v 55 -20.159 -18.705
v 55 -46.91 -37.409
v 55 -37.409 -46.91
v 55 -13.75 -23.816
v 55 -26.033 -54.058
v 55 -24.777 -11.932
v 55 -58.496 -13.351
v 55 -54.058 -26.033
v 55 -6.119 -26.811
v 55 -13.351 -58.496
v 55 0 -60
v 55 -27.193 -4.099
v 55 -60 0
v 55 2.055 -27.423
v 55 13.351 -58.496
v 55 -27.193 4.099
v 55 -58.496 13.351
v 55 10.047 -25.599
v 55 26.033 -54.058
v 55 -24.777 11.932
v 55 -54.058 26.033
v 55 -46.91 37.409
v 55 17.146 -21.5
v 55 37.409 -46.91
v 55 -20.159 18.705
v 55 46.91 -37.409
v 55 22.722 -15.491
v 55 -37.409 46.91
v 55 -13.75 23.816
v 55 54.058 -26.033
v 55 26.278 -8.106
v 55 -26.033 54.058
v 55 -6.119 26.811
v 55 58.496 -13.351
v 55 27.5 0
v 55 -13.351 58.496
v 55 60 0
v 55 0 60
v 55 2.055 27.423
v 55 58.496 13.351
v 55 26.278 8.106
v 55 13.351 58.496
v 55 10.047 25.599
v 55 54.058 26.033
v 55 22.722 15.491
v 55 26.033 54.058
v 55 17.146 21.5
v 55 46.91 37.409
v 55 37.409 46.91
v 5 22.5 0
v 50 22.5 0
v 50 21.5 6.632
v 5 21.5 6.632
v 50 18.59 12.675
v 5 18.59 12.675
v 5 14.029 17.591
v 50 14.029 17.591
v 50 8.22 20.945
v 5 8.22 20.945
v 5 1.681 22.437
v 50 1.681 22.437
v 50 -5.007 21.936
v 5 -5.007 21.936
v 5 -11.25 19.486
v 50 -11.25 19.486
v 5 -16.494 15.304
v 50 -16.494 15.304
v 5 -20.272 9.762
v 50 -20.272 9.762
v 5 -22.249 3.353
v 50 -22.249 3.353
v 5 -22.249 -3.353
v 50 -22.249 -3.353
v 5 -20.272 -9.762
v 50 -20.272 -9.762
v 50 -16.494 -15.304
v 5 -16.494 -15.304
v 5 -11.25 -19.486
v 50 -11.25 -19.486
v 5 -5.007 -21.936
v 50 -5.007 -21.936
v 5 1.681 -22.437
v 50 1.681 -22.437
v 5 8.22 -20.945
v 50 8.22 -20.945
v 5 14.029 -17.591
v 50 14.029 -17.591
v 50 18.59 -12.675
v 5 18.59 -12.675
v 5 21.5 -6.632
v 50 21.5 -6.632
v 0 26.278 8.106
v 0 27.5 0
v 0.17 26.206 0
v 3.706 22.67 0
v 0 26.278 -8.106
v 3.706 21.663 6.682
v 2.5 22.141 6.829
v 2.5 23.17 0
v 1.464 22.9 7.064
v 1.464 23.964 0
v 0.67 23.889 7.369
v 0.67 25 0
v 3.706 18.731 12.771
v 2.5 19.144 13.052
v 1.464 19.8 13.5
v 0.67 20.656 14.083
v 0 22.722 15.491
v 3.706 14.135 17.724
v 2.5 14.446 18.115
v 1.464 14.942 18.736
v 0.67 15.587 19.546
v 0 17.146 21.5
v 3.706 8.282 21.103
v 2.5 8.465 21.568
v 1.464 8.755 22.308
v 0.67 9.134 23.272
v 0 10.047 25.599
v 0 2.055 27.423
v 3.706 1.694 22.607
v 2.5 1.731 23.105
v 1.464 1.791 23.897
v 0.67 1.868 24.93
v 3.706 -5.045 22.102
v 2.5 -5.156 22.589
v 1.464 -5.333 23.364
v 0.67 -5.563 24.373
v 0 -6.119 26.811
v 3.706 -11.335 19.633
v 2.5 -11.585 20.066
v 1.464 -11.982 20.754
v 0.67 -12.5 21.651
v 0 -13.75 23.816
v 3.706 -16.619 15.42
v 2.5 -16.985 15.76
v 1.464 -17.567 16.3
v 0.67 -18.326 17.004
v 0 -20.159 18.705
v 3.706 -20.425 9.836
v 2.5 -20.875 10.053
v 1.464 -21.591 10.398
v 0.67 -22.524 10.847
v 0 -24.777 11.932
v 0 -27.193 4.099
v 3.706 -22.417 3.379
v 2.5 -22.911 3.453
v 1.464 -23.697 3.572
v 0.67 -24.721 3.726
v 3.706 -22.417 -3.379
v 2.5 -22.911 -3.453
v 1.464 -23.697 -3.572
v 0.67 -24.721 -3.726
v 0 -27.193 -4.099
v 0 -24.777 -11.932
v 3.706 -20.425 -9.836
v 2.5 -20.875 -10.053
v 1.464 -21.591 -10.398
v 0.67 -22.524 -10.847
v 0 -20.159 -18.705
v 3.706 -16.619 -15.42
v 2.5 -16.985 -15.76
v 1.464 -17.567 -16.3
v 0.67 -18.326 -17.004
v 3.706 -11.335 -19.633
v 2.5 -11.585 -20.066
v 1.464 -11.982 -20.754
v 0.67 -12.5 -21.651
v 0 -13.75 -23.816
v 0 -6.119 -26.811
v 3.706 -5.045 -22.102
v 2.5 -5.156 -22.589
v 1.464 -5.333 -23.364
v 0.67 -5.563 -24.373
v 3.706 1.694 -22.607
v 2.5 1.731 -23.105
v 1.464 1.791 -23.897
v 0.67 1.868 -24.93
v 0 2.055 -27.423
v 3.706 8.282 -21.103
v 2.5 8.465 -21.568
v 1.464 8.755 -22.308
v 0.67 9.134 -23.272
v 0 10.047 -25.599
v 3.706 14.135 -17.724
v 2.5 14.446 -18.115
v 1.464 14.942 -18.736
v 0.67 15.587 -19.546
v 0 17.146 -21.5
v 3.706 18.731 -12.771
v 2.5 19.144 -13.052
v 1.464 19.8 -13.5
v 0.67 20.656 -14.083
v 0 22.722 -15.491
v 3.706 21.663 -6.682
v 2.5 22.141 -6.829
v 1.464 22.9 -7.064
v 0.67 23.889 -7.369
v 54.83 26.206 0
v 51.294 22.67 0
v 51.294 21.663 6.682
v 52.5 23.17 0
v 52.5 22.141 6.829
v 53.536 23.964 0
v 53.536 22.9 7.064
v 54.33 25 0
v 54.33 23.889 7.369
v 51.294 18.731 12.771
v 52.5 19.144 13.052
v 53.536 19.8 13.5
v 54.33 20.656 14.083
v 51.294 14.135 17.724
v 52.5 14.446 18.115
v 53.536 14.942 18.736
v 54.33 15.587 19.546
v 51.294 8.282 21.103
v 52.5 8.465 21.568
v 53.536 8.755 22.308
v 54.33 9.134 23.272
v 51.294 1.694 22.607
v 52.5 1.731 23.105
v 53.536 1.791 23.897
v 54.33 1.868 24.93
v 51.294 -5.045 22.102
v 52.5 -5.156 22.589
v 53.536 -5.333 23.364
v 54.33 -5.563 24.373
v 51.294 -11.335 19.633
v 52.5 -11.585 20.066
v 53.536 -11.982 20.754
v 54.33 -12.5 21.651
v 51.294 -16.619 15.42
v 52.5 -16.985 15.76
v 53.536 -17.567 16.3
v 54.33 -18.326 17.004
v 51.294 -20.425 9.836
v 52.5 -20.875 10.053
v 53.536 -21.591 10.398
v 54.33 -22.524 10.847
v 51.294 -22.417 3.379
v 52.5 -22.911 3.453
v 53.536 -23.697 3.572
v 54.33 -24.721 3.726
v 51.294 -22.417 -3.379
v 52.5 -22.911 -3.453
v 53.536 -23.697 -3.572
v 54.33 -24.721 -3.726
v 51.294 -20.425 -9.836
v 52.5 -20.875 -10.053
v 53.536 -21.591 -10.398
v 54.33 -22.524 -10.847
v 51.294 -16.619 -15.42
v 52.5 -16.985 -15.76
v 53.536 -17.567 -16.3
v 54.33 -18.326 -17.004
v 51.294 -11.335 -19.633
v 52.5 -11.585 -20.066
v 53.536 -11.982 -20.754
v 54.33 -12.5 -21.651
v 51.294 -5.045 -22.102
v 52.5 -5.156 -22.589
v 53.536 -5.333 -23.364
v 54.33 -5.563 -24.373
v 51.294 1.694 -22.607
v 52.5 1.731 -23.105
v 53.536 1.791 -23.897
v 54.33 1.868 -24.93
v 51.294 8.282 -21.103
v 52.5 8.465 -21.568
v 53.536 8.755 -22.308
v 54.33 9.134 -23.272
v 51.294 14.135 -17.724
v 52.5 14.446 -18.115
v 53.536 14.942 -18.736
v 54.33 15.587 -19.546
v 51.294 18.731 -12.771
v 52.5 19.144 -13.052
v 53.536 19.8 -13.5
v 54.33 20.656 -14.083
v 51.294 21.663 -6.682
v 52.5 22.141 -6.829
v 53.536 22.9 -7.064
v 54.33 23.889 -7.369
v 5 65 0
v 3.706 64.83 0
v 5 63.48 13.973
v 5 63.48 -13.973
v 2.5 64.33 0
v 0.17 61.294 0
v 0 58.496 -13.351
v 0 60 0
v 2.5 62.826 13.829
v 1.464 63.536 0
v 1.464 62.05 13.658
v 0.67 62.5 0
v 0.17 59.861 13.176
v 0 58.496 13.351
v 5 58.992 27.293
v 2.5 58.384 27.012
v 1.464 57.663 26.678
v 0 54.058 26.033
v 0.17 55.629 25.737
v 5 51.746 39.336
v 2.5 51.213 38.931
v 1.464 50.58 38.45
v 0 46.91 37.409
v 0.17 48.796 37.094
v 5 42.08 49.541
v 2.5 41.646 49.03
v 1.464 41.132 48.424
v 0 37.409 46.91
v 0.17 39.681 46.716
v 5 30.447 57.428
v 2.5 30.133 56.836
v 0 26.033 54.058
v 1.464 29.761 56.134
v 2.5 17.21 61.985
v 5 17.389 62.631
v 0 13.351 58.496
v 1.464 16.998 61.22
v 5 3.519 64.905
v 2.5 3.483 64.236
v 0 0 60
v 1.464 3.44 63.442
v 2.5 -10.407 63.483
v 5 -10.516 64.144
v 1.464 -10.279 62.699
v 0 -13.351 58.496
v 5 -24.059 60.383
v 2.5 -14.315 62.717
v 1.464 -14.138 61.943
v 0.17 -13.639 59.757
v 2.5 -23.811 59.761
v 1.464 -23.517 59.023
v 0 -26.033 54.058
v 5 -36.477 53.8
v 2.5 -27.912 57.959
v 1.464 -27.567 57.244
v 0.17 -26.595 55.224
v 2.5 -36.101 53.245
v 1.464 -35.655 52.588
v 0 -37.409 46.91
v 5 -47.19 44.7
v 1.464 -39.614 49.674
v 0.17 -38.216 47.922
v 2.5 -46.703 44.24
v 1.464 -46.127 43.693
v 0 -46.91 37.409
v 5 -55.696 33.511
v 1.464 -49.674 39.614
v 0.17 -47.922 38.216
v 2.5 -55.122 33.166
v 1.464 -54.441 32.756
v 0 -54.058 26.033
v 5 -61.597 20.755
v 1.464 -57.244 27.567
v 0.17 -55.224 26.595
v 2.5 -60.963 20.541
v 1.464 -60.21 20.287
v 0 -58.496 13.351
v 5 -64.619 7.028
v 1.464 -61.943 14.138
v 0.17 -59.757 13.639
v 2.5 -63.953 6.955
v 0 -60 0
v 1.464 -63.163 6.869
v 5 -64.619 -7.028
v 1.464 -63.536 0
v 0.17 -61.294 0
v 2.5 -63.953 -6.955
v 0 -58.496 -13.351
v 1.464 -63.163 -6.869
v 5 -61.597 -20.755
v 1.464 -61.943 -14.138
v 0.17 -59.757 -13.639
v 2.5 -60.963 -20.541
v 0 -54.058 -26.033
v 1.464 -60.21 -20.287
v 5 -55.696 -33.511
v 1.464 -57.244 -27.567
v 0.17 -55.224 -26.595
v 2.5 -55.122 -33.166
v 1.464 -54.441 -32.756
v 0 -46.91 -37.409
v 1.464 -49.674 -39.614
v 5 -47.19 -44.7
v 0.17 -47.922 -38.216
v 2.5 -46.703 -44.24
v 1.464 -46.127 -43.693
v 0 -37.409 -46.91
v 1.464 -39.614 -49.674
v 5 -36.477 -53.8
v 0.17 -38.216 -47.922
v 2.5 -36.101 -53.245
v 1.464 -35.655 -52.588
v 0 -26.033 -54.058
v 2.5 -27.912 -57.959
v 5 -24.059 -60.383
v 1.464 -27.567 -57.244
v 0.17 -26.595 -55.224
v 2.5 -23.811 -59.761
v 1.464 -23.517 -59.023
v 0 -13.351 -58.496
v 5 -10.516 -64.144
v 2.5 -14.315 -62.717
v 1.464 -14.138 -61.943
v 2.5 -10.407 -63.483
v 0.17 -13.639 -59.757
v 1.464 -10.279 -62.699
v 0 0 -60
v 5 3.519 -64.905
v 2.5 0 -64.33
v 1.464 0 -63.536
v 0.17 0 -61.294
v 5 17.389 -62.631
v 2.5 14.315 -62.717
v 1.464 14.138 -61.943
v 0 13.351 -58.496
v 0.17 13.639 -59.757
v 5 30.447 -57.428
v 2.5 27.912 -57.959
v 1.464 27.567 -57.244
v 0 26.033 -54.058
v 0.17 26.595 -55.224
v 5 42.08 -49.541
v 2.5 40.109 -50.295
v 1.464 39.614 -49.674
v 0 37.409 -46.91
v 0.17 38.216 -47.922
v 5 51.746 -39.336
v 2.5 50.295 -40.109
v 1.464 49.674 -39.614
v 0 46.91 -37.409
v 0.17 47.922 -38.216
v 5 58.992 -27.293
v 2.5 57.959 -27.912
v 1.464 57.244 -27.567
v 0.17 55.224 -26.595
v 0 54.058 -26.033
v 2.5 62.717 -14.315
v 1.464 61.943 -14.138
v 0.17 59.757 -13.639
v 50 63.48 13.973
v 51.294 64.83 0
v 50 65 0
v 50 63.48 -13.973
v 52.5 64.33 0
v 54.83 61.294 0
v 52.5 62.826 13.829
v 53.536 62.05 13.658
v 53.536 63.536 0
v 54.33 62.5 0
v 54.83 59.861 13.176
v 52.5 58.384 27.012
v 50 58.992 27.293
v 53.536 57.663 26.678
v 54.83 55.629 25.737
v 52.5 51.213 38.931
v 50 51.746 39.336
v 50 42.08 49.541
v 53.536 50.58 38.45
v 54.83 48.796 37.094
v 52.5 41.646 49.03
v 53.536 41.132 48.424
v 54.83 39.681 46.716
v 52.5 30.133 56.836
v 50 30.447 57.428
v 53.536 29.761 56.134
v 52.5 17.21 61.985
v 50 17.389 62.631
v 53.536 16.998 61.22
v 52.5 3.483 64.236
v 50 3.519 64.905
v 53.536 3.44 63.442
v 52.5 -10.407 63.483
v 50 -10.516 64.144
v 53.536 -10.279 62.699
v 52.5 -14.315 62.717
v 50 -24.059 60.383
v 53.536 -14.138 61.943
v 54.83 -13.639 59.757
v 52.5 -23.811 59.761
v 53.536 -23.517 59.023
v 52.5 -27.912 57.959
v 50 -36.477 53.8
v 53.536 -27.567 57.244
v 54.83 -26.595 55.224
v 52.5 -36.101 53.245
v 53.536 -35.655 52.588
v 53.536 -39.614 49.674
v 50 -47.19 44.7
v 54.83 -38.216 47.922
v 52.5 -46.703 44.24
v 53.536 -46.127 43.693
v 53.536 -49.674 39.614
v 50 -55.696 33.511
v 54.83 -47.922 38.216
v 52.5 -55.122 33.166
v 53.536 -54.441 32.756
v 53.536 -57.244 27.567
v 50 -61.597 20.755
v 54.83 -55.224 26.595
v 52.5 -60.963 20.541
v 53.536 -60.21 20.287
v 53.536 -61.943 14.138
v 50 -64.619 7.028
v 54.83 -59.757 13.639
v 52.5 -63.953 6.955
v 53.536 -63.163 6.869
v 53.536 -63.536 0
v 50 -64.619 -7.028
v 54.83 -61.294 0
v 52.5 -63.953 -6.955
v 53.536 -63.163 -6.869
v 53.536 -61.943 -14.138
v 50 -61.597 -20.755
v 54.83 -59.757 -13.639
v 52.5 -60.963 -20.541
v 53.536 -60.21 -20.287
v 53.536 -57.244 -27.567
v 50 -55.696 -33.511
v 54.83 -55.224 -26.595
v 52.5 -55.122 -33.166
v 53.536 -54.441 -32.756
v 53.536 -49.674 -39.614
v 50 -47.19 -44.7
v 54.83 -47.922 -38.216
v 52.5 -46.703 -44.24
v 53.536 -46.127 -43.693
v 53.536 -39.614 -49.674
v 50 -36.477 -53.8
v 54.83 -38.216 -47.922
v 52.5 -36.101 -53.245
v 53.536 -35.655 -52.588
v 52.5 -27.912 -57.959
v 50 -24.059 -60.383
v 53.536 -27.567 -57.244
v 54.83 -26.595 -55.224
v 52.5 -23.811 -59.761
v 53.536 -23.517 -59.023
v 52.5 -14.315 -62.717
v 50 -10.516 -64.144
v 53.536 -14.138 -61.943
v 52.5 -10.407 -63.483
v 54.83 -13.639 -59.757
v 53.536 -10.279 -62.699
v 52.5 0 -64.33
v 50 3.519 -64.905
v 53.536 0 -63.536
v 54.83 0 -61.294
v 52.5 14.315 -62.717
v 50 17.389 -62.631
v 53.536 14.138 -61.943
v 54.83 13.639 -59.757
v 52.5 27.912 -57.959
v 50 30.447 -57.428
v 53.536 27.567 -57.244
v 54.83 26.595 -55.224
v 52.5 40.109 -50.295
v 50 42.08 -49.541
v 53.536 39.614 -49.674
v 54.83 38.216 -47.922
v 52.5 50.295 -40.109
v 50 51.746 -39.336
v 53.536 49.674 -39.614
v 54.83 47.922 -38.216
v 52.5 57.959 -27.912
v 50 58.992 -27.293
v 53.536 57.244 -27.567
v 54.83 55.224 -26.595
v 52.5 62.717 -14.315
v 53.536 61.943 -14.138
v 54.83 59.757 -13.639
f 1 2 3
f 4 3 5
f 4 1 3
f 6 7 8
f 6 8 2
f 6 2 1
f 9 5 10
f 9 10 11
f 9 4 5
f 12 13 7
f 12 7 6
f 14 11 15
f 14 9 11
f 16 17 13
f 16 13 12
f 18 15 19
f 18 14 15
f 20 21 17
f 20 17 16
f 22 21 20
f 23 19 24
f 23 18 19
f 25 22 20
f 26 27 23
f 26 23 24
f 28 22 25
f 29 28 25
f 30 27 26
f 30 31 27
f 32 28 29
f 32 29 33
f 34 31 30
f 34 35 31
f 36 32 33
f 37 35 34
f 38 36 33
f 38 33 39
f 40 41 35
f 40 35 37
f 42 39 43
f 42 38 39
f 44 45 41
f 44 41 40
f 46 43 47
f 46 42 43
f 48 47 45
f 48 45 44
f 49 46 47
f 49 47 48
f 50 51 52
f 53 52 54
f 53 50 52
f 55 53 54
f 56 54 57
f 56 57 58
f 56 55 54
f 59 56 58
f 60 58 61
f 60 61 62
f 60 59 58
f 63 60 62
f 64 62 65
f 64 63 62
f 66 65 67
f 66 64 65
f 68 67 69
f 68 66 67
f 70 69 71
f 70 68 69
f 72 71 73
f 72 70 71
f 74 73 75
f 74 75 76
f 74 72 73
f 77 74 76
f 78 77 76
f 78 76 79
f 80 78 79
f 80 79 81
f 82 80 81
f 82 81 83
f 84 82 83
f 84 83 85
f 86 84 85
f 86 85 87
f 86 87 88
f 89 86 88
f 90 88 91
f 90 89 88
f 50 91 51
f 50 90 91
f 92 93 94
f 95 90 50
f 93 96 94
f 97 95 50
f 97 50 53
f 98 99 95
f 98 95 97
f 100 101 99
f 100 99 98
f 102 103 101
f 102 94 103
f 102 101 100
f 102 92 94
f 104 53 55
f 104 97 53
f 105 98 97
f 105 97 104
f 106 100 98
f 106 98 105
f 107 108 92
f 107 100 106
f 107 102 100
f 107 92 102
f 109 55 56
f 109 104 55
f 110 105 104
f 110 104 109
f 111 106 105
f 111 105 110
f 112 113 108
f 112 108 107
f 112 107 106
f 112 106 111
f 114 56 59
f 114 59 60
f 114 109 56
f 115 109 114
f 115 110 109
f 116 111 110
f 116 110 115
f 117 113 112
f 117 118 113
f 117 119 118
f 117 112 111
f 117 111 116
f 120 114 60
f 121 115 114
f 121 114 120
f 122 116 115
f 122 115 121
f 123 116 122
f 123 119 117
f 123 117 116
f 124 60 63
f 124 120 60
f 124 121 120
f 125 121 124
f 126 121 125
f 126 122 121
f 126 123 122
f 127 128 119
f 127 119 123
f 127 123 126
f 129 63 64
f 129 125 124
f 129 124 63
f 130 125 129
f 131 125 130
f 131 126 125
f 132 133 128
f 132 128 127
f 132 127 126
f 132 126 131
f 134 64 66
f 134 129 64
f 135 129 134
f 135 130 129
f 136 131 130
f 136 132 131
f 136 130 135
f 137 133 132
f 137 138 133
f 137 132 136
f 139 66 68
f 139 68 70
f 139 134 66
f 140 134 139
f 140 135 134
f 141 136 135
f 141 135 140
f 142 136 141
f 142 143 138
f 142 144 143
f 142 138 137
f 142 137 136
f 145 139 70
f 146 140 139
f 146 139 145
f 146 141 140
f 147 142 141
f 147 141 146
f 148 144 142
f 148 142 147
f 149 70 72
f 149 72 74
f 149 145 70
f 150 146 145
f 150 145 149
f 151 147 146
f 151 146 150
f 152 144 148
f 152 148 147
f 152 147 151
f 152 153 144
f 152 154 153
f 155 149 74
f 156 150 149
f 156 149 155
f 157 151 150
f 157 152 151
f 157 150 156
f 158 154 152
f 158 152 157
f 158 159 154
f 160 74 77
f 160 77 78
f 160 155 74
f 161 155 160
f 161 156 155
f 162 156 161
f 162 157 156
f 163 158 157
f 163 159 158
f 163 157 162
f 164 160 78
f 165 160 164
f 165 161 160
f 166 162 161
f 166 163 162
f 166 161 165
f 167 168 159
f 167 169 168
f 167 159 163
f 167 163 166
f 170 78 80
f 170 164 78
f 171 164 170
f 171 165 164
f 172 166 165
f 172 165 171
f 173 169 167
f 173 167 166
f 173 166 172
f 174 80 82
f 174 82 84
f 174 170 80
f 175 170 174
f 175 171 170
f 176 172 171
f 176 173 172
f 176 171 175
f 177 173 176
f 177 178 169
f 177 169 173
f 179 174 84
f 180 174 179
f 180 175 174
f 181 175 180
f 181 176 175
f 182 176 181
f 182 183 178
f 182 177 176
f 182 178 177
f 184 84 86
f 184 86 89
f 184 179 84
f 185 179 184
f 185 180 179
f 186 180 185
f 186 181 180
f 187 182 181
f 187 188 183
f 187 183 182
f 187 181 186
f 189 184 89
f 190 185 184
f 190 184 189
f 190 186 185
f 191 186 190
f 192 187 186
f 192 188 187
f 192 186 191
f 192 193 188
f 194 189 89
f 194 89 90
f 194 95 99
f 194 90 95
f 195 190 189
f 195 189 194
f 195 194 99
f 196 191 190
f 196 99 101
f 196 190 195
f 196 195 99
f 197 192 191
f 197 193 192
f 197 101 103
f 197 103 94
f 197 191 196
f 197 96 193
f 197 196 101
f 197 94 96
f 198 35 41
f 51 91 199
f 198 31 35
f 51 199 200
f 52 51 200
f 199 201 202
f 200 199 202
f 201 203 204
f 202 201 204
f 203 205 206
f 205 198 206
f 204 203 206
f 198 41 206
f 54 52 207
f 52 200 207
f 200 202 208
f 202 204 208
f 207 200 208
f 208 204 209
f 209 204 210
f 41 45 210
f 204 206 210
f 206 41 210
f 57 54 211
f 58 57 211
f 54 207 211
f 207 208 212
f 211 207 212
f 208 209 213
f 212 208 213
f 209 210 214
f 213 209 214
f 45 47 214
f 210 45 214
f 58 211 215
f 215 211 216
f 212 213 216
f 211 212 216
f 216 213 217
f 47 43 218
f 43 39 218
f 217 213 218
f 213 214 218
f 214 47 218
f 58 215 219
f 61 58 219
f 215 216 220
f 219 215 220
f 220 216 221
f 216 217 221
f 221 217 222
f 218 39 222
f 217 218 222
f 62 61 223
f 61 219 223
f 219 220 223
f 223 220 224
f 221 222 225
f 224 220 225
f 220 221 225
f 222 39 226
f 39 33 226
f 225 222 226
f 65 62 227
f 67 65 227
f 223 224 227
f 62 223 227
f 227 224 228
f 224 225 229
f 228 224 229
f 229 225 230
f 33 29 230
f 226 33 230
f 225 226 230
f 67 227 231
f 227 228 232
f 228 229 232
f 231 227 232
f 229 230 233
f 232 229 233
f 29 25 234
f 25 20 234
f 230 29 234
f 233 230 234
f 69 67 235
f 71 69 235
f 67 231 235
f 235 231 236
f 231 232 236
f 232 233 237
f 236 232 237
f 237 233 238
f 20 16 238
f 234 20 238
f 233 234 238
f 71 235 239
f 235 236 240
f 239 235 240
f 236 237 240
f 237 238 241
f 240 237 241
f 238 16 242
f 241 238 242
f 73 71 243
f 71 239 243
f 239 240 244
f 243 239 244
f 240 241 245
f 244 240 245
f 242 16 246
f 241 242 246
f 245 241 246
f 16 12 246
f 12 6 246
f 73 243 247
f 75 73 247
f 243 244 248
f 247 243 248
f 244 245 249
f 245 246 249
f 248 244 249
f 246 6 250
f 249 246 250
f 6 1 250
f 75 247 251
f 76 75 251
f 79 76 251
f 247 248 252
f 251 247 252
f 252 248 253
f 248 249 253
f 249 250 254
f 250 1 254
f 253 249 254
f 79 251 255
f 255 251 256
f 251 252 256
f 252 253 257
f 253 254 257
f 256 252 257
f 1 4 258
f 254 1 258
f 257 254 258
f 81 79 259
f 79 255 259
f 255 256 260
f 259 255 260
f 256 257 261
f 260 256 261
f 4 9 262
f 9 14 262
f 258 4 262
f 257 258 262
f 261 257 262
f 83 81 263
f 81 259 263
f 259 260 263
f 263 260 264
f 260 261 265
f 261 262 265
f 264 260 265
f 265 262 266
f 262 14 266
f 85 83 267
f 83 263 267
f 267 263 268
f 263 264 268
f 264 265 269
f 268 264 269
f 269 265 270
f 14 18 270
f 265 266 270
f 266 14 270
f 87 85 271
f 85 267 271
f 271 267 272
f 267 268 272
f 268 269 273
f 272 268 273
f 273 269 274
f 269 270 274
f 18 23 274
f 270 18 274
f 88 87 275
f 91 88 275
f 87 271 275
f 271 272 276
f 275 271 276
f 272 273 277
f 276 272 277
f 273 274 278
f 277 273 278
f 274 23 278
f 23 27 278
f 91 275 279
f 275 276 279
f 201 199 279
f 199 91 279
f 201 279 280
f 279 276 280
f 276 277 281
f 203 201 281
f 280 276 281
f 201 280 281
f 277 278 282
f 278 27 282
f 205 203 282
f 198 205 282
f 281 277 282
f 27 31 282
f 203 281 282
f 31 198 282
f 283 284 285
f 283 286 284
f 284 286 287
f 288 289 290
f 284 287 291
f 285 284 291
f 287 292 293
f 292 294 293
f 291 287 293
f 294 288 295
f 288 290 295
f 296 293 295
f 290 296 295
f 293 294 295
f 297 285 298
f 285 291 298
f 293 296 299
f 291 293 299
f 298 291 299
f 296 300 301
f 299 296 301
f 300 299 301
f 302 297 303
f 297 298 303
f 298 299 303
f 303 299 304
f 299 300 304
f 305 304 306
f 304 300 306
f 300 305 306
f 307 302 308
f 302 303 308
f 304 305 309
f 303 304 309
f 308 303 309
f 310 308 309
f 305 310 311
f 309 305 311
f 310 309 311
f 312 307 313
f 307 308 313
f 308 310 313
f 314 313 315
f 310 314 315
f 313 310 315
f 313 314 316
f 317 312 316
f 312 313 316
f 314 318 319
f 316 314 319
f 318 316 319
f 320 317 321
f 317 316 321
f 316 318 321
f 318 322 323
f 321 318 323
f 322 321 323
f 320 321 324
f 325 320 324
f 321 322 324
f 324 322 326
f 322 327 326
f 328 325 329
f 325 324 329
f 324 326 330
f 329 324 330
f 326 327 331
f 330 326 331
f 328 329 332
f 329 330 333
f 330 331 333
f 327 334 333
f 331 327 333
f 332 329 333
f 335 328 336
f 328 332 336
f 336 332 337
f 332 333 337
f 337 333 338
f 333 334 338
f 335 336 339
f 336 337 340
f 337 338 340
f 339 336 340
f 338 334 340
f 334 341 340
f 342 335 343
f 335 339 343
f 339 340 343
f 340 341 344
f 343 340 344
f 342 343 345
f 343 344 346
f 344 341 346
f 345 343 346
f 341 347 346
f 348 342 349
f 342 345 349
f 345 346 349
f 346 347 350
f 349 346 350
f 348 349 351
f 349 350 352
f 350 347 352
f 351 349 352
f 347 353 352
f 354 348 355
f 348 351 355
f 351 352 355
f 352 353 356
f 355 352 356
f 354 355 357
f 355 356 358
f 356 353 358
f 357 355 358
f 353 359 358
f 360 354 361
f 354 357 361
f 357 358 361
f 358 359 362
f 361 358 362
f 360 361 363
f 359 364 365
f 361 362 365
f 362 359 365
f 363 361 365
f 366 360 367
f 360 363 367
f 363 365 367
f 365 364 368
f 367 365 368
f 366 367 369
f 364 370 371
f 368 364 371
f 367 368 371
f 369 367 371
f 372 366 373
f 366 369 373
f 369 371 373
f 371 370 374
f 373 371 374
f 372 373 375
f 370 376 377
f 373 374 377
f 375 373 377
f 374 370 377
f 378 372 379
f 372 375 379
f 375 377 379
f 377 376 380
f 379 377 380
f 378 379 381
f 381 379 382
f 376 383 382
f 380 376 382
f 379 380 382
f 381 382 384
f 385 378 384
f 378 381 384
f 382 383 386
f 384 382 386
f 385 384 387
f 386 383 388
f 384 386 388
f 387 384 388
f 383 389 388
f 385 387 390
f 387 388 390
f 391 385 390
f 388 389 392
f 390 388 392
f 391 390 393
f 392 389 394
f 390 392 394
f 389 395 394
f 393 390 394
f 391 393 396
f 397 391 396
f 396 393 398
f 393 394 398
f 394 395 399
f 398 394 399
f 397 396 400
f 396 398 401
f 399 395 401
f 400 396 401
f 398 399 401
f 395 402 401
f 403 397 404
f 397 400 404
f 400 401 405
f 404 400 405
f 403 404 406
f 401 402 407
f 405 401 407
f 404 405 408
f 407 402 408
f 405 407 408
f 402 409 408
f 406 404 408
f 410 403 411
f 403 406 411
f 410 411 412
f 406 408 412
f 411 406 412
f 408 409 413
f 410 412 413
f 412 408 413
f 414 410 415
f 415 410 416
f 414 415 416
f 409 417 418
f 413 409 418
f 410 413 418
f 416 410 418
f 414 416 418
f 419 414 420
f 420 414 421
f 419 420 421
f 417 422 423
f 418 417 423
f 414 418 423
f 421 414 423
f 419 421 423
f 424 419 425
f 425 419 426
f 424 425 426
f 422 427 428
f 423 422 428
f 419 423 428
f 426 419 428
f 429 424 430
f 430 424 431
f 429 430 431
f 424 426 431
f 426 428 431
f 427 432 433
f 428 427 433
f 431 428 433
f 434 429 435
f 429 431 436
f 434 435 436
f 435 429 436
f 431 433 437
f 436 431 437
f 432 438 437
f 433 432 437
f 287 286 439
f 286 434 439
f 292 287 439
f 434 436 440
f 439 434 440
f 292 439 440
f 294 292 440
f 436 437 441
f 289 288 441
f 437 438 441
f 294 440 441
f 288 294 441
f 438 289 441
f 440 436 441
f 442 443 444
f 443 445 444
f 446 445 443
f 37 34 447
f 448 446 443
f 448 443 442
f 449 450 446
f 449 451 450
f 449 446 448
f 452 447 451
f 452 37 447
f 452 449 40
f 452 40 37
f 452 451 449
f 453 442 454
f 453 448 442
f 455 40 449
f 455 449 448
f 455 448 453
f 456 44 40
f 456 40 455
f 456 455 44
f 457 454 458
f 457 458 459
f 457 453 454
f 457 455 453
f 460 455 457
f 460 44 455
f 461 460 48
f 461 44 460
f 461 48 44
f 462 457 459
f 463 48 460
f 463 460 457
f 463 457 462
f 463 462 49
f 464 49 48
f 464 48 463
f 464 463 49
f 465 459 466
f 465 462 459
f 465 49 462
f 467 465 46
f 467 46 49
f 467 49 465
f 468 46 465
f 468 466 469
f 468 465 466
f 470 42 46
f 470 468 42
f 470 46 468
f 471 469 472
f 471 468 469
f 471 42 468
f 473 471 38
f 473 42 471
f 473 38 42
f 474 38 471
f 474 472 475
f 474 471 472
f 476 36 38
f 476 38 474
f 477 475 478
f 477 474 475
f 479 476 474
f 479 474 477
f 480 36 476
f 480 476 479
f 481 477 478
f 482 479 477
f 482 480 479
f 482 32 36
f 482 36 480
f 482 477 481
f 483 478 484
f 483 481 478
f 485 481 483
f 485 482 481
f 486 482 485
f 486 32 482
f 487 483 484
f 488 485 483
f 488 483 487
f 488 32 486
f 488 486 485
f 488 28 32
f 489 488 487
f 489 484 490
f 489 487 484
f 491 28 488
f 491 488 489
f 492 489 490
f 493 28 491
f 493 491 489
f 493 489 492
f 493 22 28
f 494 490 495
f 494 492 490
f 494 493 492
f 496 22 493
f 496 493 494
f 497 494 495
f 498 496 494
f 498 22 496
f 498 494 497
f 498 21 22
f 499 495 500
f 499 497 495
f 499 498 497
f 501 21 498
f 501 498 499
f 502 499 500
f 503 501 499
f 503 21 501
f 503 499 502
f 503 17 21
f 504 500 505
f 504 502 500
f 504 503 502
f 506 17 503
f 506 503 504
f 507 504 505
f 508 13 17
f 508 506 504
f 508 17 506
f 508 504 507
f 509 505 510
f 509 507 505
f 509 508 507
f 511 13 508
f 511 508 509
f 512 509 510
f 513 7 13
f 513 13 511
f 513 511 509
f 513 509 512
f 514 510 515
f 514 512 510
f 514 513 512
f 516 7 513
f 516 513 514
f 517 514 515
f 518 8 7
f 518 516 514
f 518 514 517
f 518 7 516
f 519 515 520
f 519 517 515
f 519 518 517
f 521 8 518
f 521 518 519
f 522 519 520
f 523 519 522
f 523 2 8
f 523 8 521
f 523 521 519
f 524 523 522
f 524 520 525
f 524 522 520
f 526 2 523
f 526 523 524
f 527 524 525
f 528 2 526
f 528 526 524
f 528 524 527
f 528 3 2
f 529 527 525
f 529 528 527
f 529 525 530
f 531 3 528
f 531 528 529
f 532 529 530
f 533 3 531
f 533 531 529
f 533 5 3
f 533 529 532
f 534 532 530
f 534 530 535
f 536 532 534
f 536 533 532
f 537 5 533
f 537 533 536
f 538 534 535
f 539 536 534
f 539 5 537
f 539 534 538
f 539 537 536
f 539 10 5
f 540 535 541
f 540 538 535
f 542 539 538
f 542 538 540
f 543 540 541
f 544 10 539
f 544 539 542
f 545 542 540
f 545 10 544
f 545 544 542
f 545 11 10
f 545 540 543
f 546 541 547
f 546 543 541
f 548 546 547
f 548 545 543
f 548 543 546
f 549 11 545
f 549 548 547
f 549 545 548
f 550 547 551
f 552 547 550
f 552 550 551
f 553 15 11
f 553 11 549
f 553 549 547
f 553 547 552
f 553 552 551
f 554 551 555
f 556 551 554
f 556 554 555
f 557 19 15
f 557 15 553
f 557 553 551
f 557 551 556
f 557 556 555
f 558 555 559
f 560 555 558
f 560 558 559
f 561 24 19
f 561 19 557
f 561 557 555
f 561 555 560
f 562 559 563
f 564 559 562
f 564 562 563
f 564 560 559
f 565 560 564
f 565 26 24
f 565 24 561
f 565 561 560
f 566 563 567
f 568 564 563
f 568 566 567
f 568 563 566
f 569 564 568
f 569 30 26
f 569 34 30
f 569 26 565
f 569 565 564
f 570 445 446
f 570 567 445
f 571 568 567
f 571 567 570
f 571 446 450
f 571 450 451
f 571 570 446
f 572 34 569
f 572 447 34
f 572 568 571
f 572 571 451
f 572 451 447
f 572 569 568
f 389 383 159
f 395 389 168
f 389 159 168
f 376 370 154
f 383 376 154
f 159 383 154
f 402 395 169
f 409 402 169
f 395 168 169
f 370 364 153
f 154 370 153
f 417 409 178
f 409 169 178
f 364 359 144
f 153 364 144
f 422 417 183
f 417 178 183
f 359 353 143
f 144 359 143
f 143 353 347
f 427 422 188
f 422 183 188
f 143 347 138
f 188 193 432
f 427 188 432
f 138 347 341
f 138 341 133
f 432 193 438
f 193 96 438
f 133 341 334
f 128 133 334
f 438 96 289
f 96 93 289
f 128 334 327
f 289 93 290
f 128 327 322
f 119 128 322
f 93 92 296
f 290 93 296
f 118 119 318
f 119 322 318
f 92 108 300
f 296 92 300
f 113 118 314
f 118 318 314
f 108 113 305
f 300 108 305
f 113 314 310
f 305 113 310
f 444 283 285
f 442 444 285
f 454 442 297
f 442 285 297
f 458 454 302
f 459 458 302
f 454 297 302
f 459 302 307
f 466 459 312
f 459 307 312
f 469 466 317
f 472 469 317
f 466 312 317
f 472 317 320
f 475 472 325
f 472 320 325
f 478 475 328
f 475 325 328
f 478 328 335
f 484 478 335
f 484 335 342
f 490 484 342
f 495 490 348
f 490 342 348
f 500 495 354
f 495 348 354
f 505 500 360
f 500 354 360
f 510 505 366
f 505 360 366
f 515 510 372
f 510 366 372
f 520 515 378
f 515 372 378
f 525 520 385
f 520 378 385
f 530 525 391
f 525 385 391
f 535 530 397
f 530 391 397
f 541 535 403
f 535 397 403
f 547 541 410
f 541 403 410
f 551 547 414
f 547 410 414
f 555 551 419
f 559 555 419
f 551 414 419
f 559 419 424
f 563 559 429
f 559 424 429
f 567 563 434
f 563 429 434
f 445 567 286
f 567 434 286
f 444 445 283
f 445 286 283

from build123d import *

# Parameters (mm, degrees)
F0_R     = 65
F0_R_2   = 22.5
F1_DEPTH = 55
F2_R     = 5


with BuildPart() as f1:
    # F0 (on Right) → F1 (new body)
    with BuildSketch(Plane.YZ):
        Circle(F0_R)
        Circle(F0_R_2, mode=Mode.SUBTRACT)
    extrude(amount=F1_DEPTH)

    # F2
    f2_edges = [f1.edges().sort_by_distance(p)[0] for p in [
        (27.5, 65, 0),
        (0, -65, 0),
        (55, -65, 0),
        (27.5, 22.5, 0),
        (0, -22.5, 0),
        (55, -22.5, 0),
    ]]
    fillet(f2_edges, radius=F2_R)


solid = f1.part
